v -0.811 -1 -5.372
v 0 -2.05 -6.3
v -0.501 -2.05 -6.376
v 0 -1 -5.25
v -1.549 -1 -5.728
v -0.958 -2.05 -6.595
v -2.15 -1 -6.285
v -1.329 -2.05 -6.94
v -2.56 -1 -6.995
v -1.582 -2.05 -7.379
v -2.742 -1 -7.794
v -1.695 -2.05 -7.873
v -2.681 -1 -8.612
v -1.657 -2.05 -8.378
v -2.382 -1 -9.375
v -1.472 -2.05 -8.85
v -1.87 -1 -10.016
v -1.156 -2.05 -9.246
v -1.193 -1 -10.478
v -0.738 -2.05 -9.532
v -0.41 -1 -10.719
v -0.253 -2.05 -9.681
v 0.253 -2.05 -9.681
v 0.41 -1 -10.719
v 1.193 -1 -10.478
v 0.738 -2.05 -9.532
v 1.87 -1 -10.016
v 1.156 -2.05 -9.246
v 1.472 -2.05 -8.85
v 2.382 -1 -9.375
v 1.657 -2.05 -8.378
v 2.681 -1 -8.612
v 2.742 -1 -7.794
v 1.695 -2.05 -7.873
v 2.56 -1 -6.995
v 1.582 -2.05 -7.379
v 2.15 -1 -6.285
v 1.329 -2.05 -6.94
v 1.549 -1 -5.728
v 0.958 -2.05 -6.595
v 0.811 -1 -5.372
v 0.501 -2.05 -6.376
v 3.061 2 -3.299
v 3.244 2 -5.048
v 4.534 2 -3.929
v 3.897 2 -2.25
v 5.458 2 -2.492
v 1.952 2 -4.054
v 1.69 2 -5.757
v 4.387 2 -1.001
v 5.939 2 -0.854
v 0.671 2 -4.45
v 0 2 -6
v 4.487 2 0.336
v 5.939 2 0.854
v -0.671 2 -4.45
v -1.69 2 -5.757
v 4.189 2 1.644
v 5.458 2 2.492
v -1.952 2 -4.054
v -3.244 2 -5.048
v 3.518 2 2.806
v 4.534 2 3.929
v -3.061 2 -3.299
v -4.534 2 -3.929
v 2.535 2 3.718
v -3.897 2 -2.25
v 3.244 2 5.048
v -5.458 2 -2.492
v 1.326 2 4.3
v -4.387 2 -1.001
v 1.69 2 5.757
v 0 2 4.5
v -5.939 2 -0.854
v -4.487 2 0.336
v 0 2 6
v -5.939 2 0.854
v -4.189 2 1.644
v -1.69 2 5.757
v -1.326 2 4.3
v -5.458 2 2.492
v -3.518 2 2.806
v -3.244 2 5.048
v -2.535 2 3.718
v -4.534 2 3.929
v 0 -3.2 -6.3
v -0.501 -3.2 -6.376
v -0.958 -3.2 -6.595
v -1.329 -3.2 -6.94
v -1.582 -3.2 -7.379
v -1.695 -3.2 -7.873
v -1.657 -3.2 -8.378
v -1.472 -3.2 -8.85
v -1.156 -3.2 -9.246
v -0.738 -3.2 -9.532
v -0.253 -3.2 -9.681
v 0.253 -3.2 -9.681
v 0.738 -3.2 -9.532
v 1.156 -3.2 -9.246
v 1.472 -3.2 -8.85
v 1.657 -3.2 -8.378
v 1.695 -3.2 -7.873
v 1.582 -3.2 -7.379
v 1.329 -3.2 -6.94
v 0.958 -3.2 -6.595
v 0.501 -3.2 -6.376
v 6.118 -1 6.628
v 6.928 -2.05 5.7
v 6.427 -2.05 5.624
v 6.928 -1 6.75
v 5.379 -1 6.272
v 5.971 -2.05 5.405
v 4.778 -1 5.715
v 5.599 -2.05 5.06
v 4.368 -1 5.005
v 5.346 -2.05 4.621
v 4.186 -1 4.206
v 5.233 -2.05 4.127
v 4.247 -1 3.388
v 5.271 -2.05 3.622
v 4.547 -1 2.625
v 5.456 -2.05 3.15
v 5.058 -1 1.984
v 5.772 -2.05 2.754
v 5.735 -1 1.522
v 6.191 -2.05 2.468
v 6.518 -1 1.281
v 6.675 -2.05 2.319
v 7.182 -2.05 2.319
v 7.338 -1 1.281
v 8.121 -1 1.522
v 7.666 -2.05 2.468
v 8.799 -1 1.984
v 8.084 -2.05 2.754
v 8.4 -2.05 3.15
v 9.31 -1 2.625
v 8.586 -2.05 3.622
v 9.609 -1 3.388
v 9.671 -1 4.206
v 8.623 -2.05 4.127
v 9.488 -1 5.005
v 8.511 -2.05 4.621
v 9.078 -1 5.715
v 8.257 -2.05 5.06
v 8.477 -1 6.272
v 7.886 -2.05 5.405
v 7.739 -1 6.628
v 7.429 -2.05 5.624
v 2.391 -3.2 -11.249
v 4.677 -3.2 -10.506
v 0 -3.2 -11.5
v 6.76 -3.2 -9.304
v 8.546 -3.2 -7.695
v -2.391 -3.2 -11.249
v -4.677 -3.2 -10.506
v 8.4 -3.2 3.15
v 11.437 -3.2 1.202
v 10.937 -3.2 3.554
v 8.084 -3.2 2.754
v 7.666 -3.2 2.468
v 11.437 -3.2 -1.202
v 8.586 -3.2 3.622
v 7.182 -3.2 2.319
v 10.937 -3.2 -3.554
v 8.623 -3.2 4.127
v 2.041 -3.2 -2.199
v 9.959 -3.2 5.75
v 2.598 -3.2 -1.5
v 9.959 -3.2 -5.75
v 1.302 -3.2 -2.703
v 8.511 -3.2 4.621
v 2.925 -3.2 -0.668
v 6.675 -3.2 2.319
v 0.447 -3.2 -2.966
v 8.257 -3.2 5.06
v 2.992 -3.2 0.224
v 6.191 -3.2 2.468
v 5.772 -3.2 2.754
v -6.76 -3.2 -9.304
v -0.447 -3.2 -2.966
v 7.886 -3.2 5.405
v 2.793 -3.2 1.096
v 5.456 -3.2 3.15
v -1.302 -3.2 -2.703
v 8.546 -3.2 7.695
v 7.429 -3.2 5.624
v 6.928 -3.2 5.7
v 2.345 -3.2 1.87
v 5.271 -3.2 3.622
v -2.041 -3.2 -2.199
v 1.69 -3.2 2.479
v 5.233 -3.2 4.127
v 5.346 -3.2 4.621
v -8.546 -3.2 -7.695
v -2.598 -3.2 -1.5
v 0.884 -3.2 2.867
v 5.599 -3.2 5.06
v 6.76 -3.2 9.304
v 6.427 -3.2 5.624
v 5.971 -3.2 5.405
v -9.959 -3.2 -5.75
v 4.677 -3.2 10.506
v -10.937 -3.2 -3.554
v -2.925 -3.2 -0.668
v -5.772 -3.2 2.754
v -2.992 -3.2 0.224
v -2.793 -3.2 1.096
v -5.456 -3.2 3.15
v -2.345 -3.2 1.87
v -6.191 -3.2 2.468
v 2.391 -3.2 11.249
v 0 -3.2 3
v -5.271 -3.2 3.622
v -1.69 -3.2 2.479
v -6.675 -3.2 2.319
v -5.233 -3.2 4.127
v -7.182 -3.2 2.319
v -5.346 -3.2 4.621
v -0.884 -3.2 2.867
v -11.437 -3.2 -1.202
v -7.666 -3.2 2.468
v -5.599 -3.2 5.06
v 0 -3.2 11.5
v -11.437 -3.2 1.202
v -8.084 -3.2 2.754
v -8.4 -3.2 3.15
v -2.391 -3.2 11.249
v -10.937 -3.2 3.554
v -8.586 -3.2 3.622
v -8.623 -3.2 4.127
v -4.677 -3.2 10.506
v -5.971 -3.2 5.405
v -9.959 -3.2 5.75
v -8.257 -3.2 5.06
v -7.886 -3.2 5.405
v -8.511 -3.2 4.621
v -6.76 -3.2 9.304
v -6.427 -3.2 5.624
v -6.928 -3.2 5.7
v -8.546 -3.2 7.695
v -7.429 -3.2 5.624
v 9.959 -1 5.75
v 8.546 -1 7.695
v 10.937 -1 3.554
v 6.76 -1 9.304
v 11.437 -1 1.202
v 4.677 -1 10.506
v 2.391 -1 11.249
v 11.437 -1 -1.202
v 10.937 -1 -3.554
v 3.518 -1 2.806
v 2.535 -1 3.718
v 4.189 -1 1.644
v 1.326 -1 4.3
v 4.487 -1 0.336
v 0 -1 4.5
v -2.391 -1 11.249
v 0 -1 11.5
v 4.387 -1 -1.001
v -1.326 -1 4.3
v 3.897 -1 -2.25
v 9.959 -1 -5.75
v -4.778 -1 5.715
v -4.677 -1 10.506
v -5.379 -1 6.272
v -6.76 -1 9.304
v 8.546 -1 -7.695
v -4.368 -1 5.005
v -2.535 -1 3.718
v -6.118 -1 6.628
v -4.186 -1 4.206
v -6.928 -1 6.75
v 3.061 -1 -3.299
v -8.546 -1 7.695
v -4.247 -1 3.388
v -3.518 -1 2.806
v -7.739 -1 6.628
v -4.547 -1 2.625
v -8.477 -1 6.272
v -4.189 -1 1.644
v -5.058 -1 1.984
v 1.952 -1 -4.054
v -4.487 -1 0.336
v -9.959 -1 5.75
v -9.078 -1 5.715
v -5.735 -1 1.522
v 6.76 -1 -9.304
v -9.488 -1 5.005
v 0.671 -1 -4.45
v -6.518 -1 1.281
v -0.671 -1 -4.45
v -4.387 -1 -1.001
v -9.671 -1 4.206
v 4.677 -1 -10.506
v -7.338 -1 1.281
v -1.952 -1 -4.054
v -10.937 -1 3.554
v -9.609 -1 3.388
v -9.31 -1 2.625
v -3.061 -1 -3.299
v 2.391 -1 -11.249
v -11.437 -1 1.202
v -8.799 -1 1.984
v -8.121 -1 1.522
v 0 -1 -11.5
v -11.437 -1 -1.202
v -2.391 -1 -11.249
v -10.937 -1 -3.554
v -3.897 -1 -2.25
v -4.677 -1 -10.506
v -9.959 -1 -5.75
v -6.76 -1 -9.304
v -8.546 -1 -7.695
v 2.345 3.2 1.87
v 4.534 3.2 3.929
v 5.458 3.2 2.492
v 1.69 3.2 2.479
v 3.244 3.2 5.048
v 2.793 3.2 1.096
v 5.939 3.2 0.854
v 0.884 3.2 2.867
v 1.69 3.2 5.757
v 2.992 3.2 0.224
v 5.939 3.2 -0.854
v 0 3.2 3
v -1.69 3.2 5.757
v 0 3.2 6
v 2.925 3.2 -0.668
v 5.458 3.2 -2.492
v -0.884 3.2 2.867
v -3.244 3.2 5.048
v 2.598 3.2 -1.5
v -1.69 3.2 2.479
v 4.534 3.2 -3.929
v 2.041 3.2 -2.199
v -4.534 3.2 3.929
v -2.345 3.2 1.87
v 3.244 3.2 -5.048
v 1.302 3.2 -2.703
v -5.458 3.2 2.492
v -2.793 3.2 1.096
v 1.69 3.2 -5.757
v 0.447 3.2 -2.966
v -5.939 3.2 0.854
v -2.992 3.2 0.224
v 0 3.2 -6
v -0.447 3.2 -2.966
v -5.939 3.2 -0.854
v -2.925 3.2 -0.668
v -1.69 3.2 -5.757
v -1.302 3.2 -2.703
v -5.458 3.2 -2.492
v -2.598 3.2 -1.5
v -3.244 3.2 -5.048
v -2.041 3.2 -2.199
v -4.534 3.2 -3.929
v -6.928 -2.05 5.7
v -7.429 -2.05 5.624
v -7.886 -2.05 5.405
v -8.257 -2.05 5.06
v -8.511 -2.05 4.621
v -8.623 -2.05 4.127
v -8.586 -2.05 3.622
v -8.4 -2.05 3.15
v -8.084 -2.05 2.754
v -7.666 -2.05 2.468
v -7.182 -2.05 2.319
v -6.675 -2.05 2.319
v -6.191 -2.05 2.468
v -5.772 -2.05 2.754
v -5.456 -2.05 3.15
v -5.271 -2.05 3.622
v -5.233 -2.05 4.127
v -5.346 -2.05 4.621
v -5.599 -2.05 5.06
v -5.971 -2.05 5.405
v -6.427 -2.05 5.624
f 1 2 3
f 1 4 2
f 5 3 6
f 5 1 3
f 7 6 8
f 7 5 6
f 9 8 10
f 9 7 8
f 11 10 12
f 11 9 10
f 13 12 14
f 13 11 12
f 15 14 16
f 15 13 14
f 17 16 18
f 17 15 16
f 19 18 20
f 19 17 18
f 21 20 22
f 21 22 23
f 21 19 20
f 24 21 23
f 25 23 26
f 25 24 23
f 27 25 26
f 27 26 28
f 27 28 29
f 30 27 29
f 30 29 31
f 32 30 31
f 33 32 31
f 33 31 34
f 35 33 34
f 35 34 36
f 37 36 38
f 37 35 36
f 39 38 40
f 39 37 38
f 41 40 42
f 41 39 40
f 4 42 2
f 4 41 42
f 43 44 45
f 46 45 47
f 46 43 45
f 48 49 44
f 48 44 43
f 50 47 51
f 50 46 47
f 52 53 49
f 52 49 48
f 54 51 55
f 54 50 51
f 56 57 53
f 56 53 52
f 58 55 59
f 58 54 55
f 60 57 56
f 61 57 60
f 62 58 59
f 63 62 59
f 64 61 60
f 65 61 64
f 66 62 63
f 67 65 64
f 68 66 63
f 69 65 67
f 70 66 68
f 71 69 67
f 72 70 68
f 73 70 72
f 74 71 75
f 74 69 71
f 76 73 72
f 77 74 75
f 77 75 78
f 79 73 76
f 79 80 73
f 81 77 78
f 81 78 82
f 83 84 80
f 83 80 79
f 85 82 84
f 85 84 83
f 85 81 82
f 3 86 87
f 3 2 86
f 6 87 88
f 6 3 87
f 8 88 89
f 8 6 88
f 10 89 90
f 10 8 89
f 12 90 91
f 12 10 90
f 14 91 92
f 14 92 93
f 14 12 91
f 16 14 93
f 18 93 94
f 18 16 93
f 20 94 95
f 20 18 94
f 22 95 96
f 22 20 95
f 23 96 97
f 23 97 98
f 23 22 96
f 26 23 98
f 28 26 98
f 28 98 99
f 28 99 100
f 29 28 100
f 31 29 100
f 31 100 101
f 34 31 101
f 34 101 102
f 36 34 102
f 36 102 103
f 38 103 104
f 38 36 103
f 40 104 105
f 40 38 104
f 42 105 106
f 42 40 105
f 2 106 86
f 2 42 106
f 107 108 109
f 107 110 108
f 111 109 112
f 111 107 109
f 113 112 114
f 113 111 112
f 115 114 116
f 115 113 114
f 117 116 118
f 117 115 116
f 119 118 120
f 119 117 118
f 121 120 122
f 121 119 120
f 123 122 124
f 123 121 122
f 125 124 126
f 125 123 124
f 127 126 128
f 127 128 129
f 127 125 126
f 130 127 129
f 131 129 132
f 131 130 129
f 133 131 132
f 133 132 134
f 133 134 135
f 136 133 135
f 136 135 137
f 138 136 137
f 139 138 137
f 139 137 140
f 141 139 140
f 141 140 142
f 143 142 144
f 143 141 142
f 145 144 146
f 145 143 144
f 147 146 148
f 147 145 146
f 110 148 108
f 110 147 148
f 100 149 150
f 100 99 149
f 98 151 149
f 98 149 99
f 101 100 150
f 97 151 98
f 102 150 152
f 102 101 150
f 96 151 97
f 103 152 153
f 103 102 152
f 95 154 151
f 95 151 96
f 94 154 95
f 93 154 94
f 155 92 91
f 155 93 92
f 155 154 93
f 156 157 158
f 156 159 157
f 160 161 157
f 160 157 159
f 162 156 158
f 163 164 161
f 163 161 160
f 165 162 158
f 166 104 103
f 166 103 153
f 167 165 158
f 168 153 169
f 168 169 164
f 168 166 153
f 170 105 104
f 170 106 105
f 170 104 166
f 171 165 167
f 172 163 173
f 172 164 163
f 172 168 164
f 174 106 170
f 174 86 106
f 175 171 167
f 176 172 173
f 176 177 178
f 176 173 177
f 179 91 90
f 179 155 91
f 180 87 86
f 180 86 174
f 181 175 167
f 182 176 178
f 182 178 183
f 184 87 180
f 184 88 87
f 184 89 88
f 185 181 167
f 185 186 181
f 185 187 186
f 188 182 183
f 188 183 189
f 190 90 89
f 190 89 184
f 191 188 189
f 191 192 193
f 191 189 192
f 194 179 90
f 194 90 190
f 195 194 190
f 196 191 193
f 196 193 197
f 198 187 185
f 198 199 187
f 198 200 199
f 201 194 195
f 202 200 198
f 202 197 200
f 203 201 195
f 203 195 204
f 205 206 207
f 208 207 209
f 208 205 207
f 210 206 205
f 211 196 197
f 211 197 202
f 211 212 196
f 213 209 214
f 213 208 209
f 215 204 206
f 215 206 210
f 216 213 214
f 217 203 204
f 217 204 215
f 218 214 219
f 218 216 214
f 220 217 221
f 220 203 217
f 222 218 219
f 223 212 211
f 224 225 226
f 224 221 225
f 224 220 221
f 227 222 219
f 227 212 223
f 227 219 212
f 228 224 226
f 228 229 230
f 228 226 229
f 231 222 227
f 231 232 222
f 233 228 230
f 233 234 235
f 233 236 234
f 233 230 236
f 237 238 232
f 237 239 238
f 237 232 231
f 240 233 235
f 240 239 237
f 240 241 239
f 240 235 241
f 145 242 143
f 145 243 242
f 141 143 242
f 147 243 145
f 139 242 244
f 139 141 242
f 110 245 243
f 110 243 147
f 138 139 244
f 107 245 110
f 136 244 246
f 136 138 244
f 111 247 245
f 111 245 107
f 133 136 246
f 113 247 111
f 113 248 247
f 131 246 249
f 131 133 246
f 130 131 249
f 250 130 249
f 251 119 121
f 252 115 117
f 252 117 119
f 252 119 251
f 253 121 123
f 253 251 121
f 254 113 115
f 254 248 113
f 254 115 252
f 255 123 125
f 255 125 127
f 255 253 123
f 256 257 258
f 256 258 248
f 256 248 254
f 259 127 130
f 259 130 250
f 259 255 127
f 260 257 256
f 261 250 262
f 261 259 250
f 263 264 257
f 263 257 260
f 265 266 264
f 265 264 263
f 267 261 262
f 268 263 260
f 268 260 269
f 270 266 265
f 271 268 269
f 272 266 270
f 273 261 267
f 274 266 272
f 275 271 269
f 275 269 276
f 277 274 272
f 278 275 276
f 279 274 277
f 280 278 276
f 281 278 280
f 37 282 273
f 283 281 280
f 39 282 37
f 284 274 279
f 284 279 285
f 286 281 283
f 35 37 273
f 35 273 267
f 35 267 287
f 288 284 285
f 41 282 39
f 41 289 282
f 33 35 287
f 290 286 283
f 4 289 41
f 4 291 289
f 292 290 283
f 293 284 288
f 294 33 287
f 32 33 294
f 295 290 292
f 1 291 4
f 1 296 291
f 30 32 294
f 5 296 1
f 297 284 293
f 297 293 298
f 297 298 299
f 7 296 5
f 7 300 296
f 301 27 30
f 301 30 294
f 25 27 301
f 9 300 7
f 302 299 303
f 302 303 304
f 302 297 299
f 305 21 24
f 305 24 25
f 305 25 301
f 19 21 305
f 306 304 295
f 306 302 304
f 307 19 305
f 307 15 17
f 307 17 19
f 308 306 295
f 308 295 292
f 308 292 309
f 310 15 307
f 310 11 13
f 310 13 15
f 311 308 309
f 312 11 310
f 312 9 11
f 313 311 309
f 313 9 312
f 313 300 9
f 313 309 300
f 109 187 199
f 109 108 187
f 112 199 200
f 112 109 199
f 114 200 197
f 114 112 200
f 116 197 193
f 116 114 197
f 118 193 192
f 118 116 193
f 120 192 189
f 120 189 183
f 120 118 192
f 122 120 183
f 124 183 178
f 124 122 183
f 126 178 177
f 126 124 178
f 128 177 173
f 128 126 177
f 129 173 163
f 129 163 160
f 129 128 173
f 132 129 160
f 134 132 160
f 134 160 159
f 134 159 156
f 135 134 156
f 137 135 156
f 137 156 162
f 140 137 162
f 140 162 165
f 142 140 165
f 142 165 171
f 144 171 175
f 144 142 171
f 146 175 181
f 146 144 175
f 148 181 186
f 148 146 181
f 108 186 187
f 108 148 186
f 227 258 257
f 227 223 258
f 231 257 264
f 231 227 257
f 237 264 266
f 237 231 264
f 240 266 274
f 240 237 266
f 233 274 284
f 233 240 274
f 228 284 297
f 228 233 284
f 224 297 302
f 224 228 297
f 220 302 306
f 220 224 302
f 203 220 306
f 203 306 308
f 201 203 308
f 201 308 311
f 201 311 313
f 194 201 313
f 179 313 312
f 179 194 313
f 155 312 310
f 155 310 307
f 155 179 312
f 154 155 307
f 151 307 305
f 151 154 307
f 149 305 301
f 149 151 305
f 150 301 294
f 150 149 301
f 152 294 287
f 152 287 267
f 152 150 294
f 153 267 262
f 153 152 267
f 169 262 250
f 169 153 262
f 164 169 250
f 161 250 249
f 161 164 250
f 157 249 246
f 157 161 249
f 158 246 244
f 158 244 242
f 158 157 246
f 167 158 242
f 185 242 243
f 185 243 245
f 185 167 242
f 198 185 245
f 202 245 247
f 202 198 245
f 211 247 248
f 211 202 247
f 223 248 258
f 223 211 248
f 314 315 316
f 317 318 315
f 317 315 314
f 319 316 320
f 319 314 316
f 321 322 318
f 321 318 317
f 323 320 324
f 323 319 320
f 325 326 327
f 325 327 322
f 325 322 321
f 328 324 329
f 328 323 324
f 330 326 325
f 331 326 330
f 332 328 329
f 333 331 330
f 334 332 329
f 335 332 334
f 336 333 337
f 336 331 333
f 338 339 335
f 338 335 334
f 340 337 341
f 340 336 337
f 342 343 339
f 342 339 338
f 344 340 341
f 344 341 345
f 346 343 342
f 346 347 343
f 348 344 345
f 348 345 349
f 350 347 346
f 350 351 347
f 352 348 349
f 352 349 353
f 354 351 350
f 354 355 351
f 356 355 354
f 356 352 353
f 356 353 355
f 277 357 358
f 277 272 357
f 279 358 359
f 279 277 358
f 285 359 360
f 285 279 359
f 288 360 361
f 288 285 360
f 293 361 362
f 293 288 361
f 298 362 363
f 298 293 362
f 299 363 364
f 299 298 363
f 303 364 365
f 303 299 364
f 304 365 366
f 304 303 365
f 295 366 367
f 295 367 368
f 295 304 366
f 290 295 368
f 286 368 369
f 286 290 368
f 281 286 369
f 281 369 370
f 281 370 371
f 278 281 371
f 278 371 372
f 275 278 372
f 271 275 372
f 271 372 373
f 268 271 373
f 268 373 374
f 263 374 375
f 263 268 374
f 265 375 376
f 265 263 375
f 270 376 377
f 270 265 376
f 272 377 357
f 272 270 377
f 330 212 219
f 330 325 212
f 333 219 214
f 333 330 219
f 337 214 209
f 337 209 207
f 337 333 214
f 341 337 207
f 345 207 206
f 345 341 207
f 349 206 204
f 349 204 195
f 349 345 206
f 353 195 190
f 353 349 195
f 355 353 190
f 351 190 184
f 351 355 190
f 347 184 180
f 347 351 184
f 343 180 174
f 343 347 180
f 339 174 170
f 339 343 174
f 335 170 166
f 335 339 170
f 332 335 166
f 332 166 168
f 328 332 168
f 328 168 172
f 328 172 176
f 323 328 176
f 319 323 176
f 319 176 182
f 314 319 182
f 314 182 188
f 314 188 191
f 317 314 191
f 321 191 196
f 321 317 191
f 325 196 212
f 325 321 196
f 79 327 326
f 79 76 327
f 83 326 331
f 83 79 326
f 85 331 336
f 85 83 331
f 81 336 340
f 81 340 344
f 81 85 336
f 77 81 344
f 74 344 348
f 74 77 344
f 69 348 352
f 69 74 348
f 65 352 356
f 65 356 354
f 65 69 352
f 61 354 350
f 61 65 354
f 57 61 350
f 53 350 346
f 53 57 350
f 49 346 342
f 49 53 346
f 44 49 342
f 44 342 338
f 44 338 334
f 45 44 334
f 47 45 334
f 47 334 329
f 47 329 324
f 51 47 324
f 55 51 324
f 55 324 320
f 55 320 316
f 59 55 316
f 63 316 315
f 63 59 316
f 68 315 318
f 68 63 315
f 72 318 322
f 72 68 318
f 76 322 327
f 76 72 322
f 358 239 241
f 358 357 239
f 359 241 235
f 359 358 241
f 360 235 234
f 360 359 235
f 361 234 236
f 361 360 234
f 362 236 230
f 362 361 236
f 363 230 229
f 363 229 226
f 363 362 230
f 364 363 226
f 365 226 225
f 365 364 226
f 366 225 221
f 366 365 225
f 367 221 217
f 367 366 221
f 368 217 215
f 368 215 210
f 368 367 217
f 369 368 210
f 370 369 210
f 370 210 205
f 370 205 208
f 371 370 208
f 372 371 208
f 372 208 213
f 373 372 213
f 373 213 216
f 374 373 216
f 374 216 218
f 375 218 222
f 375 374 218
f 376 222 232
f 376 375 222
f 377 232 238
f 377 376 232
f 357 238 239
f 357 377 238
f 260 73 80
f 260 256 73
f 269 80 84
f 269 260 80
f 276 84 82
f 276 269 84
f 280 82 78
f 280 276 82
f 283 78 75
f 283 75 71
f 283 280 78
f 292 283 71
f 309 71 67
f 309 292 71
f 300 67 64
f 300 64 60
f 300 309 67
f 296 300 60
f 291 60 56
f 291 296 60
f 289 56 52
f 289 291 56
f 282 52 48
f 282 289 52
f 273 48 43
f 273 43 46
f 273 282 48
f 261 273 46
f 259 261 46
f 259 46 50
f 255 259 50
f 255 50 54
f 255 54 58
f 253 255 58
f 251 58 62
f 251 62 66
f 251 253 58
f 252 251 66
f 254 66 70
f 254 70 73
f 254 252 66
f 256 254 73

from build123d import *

# Parameters (mm, degrees)
CSK_FOR_M3_FLAT_HEAD_MACHINE_SCREW1_AT_2_COUNT = 2
CSK_FOR_M3_FLAT_HEAD_MACHINE_SCREW1_AT_2_PITCH = 13.856406461
CSK_FOR_M3_FLAT_HEAD_MACHINE_SCREW1_AT_3_COUNT = 2
CSK_FOR_M3_FLAT_HEAD_MACHINE_SCREW1_AT_3_PITCH = 13.856406461


with BuildPart() as part:
    # Esquisse1 → Révolution1 (revolve)
    with BuildSketch(Plane.XY, mode=Mode.PRIVATE) as r_volution1_sk:
        Polygon((3, -3.2), (3, 3.2), (6, 3.2), (6, 2), (4.5, 2), (4.5, -1), (11.5, -1), (11.5, -3.2), align=None)
    revolve(r_volution1_sk.sketch.rotate(Axis((0, 4.689873418, 0), (0, -1, 0)), 90), axis=Axis((0, 4.689873418, 0), (0, -1, 0)))

    # Esquisse4 → CSK for M3 Flat Head Machine Screw1 (revolve, cut)
    with BuildSketch(Plane(origin=(-6.92820323, -1, 4), x_dir=(0, 0, 1), z_dir=(1, 0, 0))):
        Polygon((0, 0), (0, 2.2), (1.7, 2.2), (1.7, 1.05), (2.75, 0), align=None)
    csk_for_m3_flat_head_machine_screw1 = revolve(axis=Axis((-6.92820323, 5.35, 4), (0, -1, 0)), mode=Mode.SUBTRACT)

    # CSK for M3 Flat Head Machine Screw1 at 2: CSK for M3 Flat Head Machine Screw1 ×2
    with Locations(*[(i * CSK_FOR_M3_FLAT_HEAD_MACHINE_SCREW1_AT_2_PITCH, 0, 0) for i in range(1, CSK_FOR_M3_FLAT_HEAD_MACHINE_SCREW1_AT_2_COUNT)]):
        add(csk_for_m3_flat_head_machine_screw1, mode=Mode.SUBTRACT)

    # CSK for M3 Flat Head Machine Screw1 at 3: CSK for M3 Flat Head Machine Screw1 ×2
    with Locations(*[Vector(0.5000000000000041, 0, -0.8660254037844364) * (i * CSK_FOR_M3_FLAT_HEAD_MACHINE_SCREW1_AT_3_PITCH) for i in range(1, CSK_FOR_M3_FLAT_HEAD_MACHINE_SCREW1_AT_3_COUNT)]):
        add(csk_for_m3_flat_head_machine_screw1, mode=Mode.SUBTRACT)


solid = part.part
